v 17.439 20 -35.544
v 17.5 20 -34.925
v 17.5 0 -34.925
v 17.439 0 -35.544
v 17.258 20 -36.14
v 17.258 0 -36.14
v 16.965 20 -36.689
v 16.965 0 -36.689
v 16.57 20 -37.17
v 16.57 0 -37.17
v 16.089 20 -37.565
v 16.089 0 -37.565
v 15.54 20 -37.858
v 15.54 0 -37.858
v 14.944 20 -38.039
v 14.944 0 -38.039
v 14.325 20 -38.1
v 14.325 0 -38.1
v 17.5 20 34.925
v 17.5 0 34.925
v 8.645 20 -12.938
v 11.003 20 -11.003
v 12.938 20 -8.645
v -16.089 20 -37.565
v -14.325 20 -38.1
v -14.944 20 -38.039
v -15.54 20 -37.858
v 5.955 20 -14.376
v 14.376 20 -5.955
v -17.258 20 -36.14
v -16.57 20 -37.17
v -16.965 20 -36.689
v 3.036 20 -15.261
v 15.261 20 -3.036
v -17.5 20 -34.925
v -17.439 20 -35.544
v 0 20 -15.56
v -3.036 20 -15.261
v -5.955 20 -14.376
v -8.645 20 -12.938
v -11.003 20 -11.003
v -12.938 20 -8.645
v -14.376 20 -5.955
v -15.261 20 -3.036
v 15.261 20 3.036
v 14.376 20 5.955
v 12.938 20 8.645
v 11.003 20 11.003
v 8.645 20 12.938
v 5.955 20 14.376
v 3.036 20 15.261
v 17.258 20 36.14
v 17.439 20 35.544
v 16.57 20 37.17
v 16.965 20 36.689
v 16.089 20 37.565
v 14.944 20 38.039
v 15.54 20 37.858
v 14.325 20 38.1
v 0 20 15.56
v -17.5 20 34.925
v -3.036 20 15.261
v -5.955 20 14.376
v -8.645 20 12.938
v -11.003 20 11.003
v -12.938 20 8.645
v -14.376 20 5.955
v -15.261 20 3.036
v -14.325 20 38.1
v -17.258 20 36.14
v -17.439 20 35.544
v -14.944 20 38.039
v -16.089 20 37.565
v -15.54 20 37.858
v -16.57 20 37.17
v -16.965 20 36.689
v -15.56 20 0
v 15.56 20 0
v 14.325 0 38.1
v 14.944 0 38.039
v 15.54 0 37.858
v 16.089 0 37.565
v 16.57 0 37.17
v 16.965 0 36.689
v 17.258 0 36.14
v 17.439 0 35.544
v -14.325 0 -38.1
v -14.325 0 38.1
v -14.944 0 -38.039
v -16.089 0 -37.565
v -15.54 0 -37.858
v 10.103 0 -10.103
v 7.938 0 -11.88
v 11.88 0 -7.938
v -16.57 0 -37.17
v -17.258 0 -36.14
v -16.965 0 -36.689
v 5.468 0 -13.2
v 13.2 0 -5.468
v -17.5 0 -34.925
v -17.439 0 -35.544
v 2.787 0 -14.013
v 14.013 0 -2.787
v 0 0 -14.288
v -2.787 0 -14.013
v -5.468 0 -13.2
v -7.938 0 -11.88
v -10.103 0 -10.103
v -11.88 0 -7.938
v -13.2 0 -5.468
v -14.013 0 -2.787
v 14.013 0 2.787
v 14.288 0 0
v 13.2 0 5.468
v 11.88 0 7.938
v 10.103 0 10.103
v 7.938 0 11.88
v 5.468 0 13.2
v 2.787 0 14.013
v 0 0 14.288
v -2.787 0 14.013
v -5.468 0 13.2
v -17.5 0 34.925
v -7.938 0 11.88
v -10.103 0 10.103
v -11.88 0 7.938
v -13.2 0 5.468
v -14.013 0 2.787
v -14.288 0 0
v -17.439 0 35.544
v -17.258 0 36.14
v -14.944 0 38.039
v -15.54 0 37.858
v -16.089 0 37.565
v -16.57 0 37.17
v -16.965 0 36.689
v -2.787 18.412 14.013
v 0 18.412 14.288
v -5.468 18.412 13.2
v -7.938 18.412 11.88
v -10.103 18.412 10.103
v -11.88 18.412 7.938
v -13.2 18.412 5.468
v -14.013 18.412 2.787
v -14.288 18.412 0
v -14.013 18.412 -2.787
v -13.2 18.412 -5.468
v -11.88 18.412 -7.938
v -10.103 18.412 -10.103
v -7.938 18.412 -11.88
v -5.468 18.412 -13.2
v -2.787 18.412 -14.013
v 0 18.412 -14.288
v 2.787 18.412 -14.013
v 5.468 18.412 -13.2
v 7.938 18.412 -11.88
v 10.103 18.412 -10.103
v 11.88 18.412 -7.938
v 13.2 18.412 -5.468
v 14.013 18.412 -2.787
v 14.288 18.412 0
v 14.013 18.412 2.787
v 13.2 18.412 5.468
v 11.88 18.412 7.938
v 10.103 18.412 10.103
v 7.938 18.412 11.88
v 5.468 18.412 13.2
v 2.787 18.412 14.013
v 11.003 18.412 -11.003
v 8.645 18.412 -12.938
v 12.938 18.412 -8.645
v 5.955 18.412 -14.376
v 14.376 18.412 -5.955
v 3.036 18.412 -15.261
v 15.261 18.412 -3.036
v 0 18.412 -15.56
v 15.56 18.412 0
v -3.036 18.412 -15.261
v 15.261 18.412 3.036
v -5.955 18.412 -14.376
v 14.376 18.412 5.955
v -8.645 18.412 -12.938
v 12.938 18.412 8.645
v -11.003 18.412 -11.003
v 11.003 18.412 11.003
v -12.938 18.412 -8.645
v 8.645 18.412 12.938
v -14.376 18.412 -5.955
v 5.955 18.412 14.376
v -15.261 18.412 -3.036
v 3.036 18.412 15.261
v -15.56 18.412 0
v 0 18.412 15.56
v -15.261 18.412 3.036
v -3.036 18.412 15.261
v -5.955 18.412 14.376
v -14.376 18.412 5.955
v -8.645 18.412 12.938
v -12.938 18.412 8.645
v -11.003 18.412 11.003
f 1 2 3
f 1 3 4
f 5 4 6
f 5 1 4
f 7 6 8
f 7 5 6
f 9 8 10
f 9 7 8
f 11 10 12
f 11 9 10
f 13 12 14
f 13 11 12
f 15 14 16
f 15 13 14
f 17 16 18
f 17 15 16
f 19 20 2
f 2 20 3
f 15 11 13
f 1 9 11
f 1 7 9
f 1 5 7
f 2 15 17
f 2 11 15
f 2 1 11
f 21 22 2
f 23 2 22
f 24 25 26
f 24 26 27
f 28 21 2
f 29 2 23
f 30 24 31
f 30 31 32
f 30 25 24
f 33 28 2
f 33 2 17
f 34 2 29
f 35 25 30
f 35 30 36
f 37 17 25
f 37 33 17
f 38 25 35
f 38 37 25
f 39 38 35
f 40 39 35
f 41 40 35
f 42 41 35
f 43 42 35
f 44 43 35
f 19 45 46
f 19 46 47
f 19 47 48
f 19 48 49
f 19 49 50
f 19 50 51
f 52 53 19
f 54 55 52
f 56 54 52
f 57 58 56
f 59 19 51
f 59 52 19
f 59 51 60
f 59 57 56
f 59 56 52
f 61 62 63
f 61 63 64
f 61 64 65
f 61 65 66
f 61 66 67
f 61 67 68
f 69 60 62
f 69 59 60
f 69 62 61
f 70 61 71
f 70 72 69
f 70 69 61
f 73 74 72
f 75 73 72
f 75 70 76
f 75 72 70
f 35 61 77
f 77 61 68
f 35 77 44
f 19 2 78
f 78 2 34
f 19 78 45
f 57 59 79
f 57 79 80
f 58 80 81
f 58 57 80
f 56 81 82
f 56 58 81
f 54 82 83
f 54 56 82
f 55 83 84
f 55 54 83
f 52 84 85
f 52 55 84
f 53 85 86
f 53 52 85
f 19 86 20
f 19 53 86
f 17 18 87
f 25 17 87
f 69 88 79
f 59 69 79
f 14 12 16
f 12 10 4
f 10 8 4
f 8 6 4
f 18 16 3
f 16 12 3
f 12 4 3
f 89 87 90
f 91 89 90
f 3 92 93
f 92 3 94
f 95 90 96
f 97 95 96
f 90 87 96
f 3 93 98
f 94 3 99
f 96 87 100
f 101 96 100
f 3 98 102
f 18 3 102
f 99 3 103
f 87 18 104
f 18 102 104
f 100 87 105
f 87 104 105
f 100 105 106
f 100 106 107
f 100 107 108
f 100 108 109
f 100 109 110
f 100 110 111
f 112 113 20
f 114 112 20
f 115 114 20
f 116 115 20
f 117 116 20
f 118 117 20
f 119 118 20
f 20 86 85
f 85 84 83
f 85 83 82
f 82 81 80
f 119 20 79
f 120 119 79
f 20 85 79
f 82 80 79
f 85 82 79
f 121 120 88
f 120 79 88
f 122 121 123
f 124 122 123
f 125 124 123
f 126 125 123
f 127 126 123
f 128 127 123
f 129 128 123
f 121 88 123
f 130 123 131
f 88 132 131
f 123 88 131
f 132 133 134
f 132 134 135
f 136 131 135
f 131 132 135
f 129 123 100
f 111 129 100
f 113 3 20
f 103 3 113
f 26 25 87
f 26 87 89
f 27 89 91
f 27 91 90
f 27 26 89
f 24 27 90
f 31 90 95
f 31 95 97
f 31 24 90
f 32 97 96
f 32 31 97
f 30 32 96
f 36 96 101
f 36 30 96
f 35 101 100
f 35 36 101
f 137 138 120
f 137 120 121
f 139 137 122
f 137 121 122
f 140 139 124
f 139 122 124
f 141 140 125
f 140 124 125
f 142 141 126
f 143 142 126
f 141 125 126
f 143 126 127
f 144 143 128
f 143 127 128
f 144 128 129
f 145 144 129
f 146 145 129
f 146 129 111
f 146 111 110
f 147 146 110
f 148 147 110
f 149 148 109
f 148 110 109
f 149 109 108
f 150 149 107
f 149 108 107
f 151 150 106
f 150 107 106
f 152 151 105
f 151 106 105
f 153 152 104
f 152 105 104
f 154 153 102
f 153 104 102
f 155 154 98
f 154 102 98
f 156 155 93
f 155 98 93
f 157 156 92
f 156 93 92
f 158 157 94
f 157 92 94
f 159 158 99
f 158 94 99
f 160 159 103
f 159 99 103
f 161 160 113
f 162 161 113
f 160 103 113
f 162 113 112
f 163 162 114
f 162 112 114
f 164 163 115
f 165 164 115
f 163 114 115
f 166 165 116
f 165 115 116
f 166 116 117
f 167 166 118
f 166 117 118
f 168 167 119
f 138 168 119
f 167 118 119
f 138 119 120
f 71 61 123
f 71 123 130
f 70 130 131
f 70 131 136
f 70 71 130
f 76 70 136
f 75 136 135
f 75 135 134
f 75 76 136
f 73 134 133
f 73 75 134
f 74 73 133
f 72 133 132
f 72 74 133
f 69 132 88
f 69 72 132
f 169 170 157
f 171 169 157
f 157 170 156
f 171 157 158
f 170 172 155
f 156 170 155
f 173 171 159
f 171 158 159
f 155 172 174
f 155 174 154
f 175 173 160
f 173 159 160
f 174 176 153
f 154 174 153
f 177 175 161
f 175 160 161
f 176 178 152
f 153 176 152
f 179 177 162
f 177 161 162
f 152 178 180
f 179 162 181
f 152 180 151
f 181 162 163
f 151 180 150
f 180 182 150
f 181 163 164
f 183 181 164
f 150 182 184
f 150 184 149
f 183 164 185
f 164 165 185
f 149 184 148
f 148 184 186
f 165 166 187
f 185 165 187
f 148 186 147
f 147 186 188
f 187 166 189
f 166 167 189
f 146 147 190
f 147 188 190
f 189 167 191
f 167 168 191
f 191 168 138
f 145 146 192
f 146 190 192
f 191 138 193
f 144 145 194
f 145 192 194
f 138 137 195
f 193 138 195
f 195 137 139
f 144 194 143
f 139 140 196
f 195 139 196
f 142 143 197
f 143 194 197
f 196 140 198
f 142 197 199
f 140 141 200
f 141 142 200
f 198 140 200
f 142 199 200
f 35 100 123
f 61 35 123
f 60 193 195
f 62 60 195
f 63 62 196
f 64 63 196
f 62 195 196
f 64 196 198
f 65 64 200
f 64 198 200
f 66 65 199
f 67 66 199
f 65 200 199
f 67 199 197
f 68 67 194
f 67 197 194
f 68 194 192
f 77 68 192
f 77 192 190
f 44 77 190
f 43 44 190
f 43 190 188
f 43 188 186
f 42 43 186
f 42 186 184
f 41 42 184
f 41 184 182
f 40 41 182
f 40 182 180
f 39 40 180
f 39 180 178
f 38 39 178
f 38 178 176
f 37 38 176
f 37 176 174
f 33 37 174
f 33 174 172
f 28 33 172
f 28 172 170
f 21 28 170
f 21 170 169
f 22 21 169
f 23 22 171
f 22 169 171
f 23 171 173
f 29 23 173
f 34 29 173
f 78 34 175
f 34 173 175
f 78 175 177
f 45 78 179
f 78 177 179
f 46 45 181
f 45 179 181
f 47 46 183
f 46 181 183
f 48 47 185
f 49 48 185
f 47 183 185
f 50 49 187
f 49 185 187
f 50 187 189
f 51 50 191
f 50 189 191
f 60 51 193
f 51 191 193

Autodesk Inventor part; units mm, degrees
ref_plane "YZ Plane" through (0, 0, 0) normal (1, 0, 0) x (0, 1, 0)
ref_plane "XZ Plane" through (0, 0, 0) normal (0, 1, 0) x (-1, 0, 0)
ref_plane "XY Plane" through (0, 0, 0) normal (0, 0, 1) x (1, 0, 0)
sketch "Sketch1" plane through (0, 0, 0) normal (0, 1, 0) x (-1, 0, 0)
  line L0 (0, -53.34) -> (0, 53.34) projected
  line L1 (-24.5, 0) -> (24.5, 0) projected
  line L2 (24.5, 0) -> (-24.5, 0) projected
  line L3 (0, -53.34) -> (0, 53.34) projected
  line L4 (-17.5, 38.1) -> (-17.5, -38.1)
  line L5 (-17.5, -38.1) -> (17.5, -38.1)
  line L6 (17.5, -38.1) -> (17.5, 38.1)
  line L7 (17.5, 38.1) -> (-17.5, 38.1)
  line L8 (-17.5, -38.1) -> (17.5, 38.1) construction
  point P0 (0, 0)
  dimension "d1" = 76.2
  dimension "d2" = 35
extrude "Extrusion1" add sketch "Sketch1" along normal blind 20
sketch "Sketch2" plane through (0, 20, 0) normal (0, 1, 0) x (1, 0, 0)
  point P0 (0, 0)
  point P1 (0, 0)
hole "Hole1" at (0, 20, 0) direction (0, -1, 0) diameter 28.575 end through all counterbore diameter 31.12 counterbore depth 1.588
fillet "Fillet1" radius 3.175 4 edges at (17.5, 10, 38.1) (17.5, 10, -38.1) (-17.5, 10, 38.1) (-17.5, 10, -38.1)
properties part number "BearingBlock"
